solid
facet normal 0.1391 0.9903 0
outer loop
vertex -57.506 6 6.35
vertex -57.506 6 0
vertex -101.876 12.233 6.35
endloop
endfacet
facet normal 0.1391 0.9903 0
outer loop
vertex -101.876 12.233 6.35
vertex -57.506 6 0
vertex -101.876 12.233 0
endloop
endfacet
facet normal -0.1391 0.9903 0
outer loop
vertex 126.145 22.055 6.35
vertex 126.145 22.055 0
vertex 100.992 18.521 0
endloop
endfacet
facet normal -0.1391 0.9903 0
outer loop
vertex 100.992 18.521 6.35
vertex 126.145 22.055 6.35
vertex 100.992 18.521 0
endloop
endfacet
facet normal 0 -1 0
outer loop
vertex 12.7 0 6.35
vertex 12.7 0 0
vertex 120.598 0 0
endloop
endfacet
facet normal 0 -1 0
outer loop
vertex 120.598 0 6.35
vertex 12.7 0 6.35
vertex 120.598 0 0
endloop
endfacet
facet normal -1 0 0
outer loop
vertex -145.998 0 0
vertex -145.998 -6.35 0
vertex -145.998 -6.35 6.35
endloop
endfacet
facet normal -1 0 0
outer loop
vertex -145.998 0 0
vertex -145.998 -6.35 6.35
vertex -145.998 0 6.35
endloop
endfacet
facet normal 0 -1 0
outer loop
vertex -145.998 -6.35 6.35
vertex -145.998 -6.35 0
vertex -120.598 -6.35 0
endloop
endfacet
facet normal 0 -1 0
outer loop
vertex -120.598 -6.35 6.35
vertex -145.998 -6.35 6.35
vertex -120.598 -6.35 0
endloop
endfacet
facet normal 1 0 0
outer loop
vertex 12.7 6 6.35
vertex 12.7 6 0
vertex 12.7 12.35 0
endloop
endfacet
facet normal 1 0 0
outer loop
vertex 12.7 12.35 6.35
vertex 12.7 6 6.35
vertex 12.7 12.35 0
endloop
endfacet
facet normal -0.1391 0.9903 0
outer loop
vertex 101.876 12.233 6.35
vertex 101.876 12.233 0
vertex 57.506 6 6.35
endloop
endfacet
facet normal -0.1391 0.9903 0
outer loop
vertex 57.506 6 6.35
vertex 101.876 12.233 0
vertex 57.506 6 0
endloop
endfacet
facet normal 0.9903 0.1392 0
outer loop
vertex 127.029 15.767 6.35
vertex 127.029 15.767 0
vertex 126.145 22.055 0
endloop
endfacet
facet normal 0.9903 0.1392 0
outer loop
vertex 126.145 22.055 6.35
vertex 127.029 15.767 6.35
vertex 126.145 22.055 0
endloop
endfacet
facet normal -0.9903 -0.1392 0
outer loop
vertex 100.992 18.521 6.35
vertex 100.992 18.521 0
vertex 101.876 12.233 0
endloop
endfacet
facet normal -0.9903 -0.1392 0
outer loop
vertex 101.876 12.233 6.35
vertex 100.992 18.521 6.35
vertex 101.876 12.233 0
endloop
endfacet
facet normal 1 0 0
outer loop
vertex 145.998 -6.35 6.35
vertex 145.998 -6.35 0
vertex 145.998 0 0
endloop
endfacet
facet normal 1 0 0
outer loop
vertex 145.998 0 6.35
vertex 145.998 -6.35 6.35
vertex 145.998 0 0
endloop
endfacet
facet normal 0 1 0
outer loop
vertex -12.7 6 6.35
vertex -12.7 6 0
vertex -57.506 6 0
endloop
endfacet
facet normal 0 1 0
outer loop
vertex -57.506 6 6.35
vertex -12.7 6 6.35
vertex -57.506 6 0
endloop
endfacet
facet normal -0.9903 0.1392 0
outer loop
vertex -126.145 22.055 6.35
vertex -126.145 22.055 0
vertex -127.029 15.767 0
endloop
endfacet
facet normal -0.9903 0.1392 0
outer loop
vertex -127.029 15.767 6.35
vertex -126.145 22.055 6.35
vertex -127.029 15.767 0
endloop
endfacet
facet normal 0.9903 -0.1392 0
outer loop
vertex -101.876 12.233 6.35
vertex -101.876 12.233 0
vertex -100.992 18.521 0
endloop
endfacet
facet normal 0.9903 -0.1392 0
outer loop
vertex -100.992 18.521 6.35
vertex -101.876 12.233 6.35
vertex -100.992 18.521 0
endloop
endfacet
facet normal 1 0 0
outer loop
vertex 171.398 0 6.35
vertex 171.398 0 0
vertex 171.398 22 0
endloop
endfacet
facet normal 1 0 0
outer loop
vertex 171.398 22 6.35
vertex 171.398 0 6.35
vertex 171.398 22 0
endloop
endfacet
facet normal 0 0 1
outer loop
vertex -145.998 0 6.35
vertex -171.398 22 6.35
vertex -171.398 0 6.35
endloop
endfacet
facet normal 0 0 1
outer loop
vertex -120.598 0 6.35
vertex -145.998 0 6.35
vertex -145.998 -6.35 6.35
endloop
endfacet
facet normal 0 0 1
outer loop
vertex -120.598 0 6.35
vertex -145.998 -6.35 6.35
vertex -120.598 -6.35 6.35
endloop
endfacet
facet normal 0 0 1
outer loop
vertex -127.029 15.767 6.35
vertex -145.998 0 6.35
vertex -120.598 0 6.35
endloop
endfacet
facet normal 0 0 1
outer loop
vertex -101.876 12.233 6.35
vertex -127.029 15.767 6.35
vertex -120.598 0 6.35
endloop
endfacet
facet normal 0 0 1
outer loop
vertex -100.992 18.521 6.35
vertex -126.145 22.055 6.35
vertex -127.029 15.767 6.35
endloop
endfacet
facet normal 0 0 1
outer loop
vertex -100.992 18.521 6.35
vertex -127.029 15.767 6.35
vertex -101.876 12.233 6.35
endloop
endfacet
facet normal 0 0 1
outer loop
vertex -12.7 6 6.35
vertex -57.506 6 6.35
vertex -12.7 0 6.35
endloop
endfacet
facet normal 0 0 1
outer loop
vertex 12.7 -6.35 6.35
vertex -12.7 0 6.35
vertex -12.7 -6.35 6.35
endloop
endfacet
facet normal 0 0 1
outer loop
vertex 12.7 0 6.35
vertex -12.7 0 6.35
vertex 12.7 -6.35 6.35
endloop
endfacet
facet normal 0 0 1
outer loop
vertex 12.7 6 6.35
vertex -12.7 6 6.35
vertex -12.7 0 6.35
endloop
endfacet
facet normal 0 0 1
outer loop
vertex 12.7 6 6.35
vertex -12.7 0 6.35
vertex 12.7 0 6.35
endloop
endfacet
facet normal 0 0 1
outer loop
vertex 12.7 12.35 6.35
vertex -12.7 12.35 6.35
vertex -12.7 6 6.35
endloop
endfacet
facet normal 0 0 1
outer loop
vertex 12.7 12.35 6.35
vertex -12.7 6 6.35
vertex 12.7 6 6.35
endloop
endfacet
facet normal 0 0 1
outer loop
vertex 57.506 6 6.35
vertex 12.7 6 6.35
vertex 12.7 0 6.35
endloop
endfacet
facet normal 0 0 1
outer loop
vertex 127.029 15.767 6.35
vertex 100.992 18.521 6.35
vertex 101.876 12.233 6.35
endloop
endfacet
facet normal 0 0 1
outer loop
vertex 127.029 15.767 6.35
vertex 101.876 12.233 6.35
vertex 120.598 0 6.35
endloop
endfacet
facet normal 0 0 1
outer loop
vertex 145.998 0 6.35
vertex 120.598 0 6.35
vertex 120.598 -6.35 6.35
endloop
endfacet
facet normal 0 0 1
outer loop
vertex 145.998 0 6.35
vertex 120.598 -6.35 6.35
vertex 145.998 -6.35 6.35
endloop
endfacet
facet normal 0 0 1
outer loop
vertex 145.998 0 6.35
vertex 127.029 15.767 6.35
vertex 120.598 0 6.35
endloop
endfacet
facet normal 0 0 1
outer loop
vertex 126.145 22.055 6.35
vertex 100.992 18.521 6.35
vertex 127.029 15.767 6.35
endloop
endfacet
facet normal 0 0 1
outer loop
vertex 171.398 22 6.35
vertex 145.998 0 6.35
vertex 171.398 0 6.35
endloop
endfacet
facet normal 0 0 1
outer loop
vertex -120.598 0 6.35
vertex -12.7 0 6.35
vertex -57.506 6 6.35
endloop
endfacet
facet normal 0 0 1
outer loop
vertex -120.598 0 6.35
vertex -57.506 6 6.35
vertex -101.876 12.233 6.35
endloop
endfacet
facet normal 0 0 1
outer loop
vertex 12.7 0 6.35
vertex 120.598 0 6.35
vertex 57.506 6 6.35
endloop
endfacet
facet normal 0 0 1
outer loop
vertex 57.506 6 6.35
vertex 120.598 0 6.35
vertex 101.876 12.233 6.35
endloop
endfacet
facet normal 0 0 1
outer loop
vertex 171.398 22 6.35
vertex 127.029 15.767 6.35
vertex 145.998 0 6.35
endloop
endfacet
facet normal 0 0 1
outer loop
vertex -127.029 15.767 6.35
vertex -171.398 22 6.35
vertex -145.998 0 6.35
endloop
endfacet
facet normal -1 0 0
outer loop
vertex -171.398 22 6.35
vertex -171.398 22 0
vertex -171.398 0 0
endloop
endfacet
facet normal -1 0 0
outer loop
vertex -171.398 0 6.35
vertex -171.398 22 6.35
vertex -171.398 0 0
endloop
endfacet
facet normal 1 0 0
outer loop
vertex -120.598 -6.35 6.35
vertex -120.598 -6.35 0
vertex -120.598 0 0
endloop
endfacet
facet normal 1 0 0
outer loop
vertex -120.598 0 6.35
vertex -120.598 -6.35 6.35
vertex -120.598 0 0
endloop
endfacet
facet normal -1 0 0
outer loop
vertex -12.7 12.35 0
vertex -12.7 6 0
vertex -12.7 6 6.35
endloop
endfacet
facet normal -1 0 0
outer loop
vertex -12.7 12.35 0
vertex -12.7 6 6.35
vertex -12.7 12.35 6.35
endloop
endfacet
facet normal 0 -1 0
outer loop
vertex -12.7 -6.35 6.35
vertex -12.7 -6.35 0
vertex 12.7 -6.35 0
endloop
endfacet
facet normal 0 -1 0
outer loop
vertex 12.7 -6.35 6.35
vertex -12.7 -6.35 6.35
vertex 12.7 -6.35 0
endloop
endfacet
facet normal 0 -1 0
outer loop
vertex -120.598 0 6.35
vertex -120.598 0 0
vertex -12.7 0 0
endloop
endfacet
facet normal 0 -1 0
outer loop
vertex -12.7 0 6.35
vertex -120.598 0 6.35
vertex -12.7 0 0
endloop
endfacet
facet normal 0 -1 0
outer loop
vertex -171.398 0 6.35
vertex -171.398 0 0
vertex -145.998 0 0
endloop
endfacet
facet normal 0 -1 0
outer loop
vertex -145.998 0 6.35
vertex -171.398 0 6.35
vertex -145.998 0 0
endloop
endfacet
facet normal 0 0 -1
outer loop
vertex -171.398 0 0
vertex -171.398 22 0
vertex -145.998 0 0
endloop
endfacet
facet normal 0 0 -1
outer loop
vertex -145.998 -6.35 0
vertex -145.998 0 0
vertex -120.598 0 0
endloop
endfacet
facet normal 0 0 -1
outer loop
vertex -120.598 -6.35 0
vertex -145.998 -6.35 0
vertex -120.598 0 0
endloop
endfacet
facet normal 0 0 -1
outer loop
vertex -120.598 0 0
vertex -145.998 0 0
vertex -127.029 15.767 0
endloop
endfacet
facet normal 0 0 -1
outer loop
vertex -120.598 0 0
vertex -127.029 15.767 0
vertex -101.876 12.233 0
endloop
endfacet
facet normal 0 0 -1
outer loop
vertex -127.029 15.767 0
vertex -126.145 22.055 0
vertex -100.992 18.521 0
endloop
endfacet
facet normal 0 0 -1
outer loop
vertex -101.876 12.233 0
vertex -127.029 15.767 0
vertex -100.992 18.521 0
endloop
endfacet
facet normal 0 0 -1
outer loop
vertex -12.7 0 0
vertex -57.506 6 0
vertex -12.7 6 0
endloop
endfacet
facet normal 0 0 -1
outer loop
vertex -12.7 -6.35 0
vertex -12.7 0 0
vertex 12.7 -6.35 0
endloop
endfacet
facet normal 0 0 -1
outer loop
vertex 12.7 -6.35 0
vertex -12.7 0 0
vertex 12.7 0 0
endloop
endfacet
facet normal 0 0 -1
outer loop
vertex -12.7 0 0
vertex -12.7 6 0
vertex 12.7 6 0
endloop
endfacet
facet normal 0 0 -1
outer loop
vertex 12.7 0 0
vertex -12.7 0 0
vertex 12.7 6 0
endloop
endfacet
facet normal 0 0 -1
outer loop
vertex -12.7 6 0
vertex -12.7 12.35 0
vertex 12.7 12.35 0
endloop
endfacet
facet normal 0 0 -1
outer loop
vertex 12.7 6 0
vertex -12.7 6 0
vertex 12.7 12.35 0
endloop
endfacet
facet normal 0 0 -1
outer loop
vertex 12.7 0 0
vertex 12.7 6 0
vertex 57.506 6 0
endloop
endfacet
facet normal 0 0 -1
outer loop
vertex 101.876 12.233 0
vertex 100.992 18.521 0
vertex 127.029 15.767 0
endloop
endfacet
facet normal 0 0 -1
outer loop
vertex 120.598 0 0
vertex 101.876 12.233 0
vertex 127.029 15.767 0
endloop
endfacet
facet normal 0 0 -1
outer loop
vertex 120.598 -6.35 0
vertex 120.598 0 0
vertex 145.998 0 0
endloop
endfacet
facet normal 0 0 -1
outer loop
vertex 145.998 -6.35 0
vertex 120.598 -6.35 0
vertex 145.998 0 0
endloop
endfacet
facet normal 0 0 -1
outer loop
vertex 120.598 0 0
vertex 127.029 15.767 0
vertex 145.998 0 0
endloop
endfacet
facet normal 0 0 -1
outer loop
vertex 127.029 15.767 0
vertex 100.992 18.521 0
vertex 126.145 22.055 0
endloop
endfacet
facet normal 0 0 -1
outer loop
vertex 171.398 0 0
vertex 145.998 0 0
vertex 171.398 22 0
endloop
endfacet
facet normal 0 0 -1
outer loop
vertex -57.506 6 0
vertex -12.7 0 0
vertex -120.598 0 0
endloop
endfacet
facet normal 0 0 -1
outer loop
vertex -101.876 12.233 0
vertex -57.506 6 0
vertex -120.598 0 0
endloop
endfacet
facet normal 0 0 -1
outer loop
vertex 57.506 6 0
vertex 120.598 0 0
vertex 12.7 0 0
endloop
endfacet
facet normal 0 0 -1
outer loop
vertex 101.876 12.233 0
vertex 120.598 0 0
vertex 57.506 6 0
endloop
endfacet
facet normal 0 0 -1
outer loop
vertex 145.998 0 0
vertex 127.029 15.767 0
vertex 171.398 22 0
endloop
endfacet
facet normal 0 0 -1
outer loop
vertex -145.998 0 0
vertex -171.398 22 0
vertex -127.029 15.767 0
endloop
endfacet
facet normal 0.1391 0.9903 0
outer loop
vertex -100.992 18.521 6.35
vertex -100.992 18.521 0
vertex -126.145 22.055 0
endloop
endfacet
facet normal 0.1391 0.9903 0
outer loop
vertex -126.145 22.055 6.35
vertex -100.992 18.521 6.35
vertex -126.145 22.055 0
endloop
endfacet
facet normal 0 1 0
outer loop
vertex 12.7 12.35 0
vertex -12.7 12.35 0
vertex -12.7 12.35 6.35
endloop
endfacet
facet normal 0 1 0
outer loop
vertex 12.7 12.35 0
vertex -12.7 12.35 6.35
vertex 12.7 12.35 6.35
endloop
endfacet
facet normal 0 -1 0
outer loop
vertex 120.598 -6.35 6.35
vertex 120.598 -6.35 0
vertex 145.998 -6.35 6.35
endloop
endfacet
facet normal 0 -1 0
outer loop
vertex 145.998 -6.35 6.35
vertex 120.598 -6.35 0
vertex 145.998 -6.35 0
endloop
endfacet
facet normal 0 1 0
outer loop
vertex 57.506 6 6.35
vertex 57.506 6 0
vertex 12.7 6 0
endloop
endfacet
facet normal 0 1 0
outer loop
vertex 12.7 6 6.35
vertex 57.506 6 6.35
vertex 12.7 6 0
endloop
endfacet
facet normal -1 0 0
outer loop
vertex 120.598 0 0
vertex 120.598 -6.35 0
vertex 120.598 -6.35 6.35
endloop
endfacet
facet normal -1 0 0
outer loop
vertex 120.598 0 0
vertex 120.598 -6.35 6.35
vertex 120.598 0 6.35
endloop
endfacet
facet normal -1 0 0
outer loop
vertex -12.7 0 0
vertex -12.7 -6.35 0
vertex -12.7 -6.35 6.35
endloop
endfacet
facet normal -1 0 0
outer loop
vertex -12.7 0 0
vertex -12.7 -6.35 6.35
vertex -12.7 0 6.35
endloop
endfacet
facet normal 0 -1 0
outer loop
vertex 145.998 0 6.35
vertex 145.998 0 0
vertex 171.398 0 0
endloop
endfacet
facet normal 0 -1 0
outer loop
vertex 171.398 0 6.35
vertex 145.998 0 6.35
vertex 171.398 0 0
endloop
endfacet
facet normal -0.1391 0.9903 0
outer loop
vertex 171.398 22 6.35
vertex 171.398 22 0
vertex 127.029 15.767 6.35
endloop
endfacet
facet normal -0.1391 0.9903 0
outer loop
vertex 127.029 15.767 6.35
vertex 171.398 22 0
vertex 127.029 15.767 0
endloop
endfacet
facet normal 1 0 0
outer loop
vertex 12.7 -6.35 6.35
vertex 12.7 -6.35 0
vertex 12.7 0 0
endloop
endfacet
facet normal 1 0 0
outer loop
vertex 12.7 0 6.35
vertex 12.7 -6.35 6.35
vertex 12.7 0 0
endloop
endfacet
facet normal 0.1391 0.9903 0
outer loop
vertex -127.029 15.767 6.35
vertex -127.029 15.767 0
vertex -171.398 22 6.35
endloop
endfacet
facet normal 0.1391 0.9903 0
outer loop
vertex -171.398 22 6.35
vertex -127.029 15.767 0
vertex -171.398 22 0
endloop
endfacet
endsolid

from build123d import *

# Parameters (mm, degrees)
F0_W     = 25.4
F0_H     = 6.35
F1_DEPTH = 6.35


with BuildPart() as f1:
    # F0 (on Top) → F1 (new body)
    with BuildSketch(Plane.XY):
        Polygon((-171.398427, 22), (-171.398427, 0), (-145.998427, 0), (-120.598427, 0), (-12.7, 0), (12.7, 0), (120.598427, 0), (145.998427, 0), (171.398427, 0), (171.398427, 22), (127.028518, 15.766784), (101.875509, 12.233216), (57.5056, 6), (12.7, 6), (-12.7, 6), (-57.5056, 6), (-101.875509, 12.233216), (-127.028518, 15.766784), align=None)
        with Locations((-133.298427, -3.175)):
            Rectangle(F0_W, F0_H)
        Polygon((-126.145126, 22.055037), (-127.028518, 15.766784), (-101.875509, 12.233216), (-100.992117, 18.521468), align=None)
        with Locations((0, -3.175)):
            Rectangle(F0_W, F0_H)
        with Locations((133.298427, -3.175)):
            Rectangle(F0_W, F0_H)
        with Locations((0, 9.175)):
            Rectangle(F0_W, F0_H)
        Polygon((100.992117, 18.521468), (101.875509, 12.233216), (127.028518, 15.766784), (126.145126, 22.055037), align=None)
    extrude(amount=F1_DEPTH)


solid = f1.part
